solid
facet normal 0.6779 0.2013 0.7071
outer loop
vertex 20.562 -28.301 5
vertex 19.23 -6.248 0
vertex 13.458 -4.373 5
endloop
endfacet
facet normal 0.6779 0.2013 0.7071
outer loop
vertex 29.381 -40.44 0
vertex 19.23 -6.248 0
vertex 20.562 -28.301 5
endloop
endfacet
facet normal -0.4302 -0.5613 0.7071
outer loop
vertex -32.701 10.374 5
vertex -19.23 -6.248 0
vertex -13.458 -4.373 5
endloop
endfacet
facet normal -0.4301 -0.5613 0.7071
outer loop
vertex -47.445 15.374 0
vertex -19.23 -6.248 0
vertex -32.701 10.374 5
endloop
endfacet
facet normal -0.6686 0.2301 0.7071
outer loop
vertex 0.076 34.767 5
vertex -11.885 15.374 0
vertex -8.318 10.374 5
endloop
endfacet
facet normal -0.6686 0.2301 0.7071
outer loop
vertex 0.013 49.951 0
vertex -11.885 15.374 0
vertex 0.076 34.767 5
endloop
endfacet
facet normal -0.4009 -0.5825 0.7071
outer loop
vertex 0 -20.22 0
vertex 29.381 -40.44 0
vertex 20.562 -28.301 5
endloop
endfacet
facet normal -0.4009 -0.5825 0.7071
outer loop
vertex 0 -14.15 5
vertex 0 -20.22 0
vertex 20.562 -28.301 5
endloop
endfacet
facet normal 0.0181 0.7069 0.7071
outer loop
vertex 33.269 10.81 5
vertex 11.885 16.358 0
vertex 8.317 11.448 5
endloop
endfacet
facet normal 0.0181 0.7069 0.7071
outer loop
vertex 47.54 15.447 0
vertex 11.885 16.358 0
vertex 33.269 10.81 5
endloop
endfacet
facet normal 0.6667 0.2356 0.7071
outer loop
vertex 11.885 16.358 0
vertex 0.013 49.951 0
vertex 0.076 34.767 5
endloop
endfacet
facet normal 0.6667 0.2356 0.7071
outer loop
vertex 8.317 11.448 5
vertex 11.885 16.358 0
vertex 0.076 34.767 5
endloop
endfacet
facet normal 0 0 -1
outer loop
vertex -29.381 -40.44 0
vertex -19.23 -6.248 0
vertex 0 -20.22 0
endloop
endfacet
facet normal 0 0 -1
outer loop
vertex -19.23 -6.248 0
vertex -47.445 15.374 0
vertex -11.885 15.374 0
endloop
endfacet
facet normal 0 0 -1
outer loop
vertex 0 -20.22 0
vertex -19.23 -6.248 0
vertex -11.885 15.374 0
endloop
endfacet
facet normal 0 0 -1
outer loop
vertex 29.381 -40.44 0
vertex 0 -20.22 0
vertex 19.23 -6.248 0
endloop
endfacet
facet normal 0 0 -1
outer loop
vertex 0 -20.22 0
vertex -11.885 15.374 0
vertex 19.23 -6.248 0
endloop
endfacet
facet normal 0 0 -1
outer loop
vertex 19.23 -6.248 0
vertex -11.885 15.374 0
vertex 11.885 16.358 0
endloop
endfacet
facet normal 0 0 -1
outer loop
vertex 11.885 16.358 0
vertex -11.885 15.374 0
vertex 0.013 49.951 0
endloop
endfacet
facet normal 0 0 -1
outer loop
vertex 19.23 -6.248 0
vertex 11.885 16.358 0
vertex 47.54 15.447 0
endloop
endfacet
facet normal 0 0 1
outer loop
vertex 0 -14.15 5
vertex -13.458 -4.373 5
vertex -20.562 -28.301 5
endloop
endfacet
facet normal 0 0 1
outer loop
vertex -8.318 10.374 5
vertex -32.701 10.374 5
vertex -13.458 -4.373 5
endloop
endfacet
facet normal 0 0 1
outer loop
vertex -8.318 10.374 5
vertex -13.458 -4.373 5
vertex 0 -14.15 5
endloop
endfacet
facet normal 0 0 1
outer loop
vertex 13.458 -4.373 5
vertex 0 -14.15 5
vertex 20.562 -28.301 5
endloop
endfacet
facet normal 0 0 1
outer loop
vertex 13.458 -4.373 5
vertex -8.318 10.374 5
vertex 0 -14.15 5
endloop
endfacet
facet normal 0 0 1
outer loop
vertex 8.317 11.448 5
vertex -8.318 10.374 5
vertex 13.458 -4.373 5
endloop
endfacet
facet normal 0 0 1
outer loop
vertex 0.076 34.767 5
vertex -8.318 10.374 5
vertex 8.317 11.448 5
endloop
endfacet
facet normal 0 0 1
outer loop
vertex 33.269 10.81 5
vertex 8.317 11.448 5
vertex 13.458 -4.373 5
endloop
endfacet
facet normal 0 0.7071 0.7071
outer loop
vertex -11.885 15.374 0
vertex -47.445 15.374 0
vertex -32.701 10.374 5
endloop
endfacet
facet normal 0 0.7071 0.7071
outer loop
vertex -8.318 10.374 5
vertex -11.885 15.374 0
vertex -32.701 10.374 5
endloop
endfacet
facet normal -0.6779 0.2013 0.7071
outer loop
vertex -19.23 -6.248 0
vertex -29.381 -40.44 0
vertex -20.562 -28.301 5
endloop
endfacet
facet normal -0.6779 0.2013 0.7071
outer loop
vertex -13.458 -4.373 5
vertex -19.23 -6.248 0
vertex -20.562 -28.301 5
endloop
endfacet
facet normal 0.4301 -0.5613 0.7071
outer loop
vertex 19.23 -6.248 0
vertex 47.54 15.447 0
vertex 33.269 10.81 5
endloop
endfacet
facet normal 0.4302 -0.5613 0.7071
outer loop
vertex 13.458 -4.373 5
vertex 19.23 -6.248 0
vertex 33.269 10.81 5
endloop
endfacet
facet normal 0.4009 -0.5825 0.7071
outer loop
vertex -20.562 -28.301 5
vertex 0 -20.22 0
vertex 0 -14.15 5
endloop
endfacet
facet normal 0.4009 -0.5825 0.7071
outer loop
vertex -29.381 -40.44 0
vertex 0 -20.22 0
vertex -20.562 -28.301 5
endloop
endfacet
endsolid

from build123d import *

# Parameters (mm, degrees)
F1_DEPTH      = 5
F2_T4_DEPTH   = 68.6680055615
F2_T9_DEPTH   = 69.5804590238
F2_T14_DEPTH  = 68.6556539851
F2_T19_DEPTH  = 68.6680055615
F2_T24_DEPTH  = 68.6680055615
F2_T29_DEPTH  = 68.6680055615
F2_T34_DEPTH  = 68.6680055615
F2_T39_DEPTH  = 68.6680055615
F2_T44_DEPTH  = 68.6680055615
F2_T49_DEPTH  = 68.6680055615
F2_T55_DEPTH  = 68.6680055615
F2_T59_DEPTH  = 68.6680055615
F2_T66_DEPTH  = 69.5804590238
F2_T70_DEPTH  = 68.6556539851
F2_T77_DEPTH  = 68.6680055615
F2_T81_DEPTH  = 68.6680055615
F2_T88_DEPTH  = 68.6680055615
F2_T92_DEPTH  = 68.6680055615
F2_T99_DEPTH  = 68.6680055615
F2_T103_DEPTH = 68.6680055615


# Not quite as in the source:
# - a fillet or chamfer that OpenCascade refuses, or shapes differently, is made with other operations: its cross-section is extruded or revolved along the edge and cut away or added


with BuildPart() as f1:
    # F0 (on Top) → F1 (new body)
    with BuildSketch(Plane.XY):
        Polygon((0, 0), (0, 52.987328628), (-12.5984860432, 16.3739850326), align=None)
        Polygon((12.5984860432, 17.3403284151), (0, 52.987328628), (0, 0), align=None)
        Polygon((0, 0), (-12.5984860432, 16.3739850326), (-50.3939441727, 16.3739850326), align=None)
        Polygon((50.3939441727, 16.3739850326), (12.5984860432, 17.3403284151), (0, 0), align=None)
        Polygon((20.3847786247, -6.6234160785), (0, 0), (31.1451703259, -42.8676493466), align=None)
        Polygon((0, -21.4338246733), (0, 0), (-31.1451703259, -42.8676493466), align=None)
        Polygon((-20.3847786247, -6.6234160785), (0, 0), (-50.3939441727, 16.3739850326), align=None)
        Polygon((50.3939441727, 16.3739850326), (0, 0), (20.3847786247, -6.6234160785), align=None)
        Polygon((31.1451703259, -42.8676493466), (0, 0), (0, -21.4338246733), align=None)
        Polygon((-31.1451703259, -42.8676493466), (0, 0), (-20.3847786247, -6.6234160785), align=None)
    extrude(amount=F1_DEPTH)

    # F2: chamfer of 6 on 10 edges, made by hand


with BuildPart() as f2_tool2:
    # F2_s3 → F2_t4 (new body)
    with BuildSketch(Plane(origin=(1.0926214012, -3.0915361725, 0), x_dir=(0, 0, 1), z_dir=(-0.3332244354, 0.9428475357, 0))):
        Polygon((-1, 17.6566726657), (5, 11.6566726657), (5, 17.6566726657), align=None)
    extrude(amount=F2_T4_DEPTH)

    split(bisect_by=Plane(origin=(0.451293236, 17.6509043406, 0), x_dir=(0, 0, 1), z_dir=(0.025559359, 0.9996733062, 0)), keep=Keep.TOP)


with BuildPart() as f1_1:
    add(f1.part)

    # F2_t1: cut F2_tool2
    add(f2_tool2.part, mode=Mode.SUBTRACT)


with BuildPart() as f2_tool7:
    # F2_s8 → F2_t9 (new body)
    with BuildSketch(Plane(origin=(21.3229816345, 61.9682119253, 0), x_dir=(0, 0, 1), z_dir=(-0.3253719116, -0.9455861247, 0))):
        Polygon((-1, 17.2405884042), (5, 11.2405884042), (5, 17.2405884042), align=None)
    extrude(amount=F2_T9_DEPTH)

    split(bisect_by=Plane.XZ.offset(-16.3739850326), keep=Keep.BOTTOM)


with BuildPart() as f1_2:
    add(f1_1.part)

    # F2_t6: cut F2_tool7
    add(f2_tool7.part, mode=Mode.SUBTRACT)


with BuildPart() as f2_tool12:
    # F2_s13 → F2_t14 (new body)
    with BuildSketch(Plane.YZ.offset(2.8316118846)):
        Polygon((16.3739850326, -1), (10.3739850326, 5), (16.3739850326, 5), align=None)
    extrude(amount=-F2_T14_DEPTH)

    split(bisect_by=Plane(origin=(-16.3024611761, 5.6096032055, 0), x_dir=(0, 0, 1), z_dir=(-0.9455861247, 0.3253719116, 0)), keep=Keep.TOP)


with BuildPart() as f1_3:
    add(f1_2.part)

    # F2_t11: cut F2_tool12
    add(f2_tool12.part, mode=Mode.SUBTRACT)


with BuildPart() as f2_tool17:
    # F2_s18 → F2_t19 (new body)
    with BuildSketch(Plane(origin=(-51.9012195214, 39.7742870116, 0), x_dir=(0, 0, 1), z_dir=(0.7937292793, -0.6082711823, 0))):
        Polygon((-1, 17.6566726657), (5, 11.6566726657), (5, 17.6566726657), align=None)
    extrude(amount=F2_T19_DEPTH)

    split(bisect_by=Plane(origin=(-16.926464871, 5.0252240345, 0), x_dir=(0, 0, 1), z_dir=(-0.9586440884, 0.2846076455, 0)), keep=Keep.TOP)


with BuildPart() as f1_4:
    add(f1_3.part)

    # F2_t16: cut F2_tool17
    add(f2_tool17.part, mode=Mode.SUBTRACT)


with BuildPart() as f2_tool22:
    # F2_s23 → F2_t24 (new body)
    with BuildSketch(Plane(origin=(0.9332100871, 3.1433320482, 0), x_dir=(0, 0, 1), z_dir=(-0.2846076455, -0.9586440884, 0))):
        Polygon((-1, 17.6566726657), (5, 11.6566726657), (5, 17.6566726657), align=None)
    extrude(amount=F2_T24_DEPTH)

    split(bisect_by=Plane(origin=(-10.7400451584, -14.014618069, 0), x_dir=(0, 0, 1), z_dir=(-0.6082711823, -0.7937292793, 0)), keep=Keep.TOP)


with BuildPart() as f1_5:
    add(f1_4.part)

    # F2_t21: cut F2_tool22
    add(f2_tool22.part, mode=Mode.SUBTRACT)


with BuildPart() as f2_tool27:
    # F2_s28 → F2_t29 (new body)
    with BuildSketch(Plane(origin=(-53.8659537043, -37.0700624038, 0), x_dir=(0, 0, 1), z_dir=(0.8237761079, 0.5669152707, 0))):
        Polygon((-1, 17.6566726657), (5, 11.6566726657), (5, 17.6566726657), align=None)
    extrude(amount=F2_T29_DEPTH)

    split(bisect_by=Plane(origin=(-10.0098373636, -14.5451450862, 0), x_dir=(0, 0, 1), z_dir=(-0.5669152707, -0.8237761079, 0)), keep=Keep.TOP)


with BuildPart() as f1_6:
    add(f1_5.part)

    # F2_t26: cut F2_tool27
    add(f2_tool27.part, mode=Mode.SUBTRACT)


with BuildPart() as f2_tool32:
    # F2_s33 → F2_t34 (new body)
    with BuildSketch(Plane(origin=(-2.7011086511, 1.8588785563, 0), x_dir=(0, 0, 1), z_dir=(0.8237761079, -0.5669152707, 0))):
        Polygon((-1, 17.6566726657), (5, 11.6566726657), (5, 17.6566726657), align=None)
    extrude(amount=F2_T34_DEPTH)

    split(bisect_by=Plane(origin=(10.0098373636, -14.5451450862, 0), x_dir=(0, 0, 1), z_dir=(0.5669152707, -0.8237761079, 0)), keep=Keep.TOP)


with BuildPart() as f1_7:
    add(f1_6.part)

    # F2_t31: cut F2_tool32
    add(f2_tool32.part, mode=Mode.SUBTRACT)


with BuildPart() as f2_tool37:
    # F2_s38 → F2_t39 (new body)
    with BuildSketch(Plane(origin=(18.6102292957, -62.6848455422, 0), x_dir=(0, 0, 1), z_dir=(-0.2846076455, 0.9586440884, 0))):
        Polygon((-1, 17.6566726657), (5, 11.6566726657), (5, 17.6566726657), align=None)
    extrude(amount=F2_T39_DEPTH)

    split(bisect_by=Plane(origin=(10.7400451584, -14.014618069, 0), x_dir=(0, 0, 1), z_dir=(0.6082711823, -0.7937292793, 0)), keep=Keep.TOP)


with BuildPart() as f1_8:
    add(f1_7.part)

    # F2_t36: cut F2_tool37
    add(f2_tool37.part, mode=Mode.SUBTRACT)


with BuildPart() as f2_tool42:
    # F2_s43 → F2_t44 (new body)
    with BuildSketch(Plane(origin=(-2.6025870408, -1.9944819195, 0), x_dir=(0, 0, 1), z_dir=(0.7937292793, 0.6082711823, 0))):
        Polygon((-1, 17.6566726657), (5, 11.6566726657), (5, 17.6566726657), align=None)
    extrude(amount=F2_T44_DEPTH)

    split(bisect_by=Plane(origin=(16.926464871, 5.0252240345, 0), x_dir=(0, 0, 1), z_dir=(0.9586440884, 0.2846076455, 0)), keep=Keep.TOP)


with BuildPart() as f1_9:
    add(f1_8.part)

    # F2_t41: cut F2_tool42
    add(f2_tool42.part, mode=Mode.SUBTRACT)


with BuildPart() as f2_tool47:
    # F2_s48 → F2_t49 (new body)
    with BuildSketch(Plane(origin=(65.3677079475, -1.6713027209, 0), x_dir=(0, 0, 1), z_dir=(-0.9996733062, 0.025559359, 0))):
        Polygon((-1, 17.6566726657), (5, 11.6566726657), (5, 17.6566726657), align=None)
    extrude(amount=F2_T49_DEPTH)

    split(bisect_by=Plane(origin=(16.6475503122, 5.8836347802, 0), x_dir=(0, 0, 1), z_dir=(0.9428475357, 0.3332244354, 0)), keep=Keep.TOP)


with BuildPart() as f1_10:
    add(f1_9.part)

    # F2_t46: cut F2_tool47
    add(f2_tool47.part, mode=Mode.SUBTRACT)


with BuildPart() as f2_tool53:
    # F2_s54 → F2_t55 (new body)
    with BuildSketch(Plane(origin=(1.0926214012, -3.0915361725, 0), x_dir=(0, 0, 1), z_dir=(-0.3332244354, 0.9428475357, 0))):
        Polygon((-1, 17.6566726657), (5, 11.6566726657), (5, 17.6566726657), align=None)
    extrude(amount=F2_T55_DEPTH)

    split(bisect_by=Plane(origin=(0.451293236, 17.6509043406, 0), x_dir=(0, 0, 1), z_dir=(-0.025559359, -0.9996733062, 0)), keep=Keep.TOP)


with BuildPart() as f2_tool57:
    # F2_s58 → F2_t59 (new body)
    with BuildSketch(Plane(origin=(65.3677079475, -1.6713027209, 0), x_dir=(0, 0, 1), z_dir=(-0.9996733062, 0.025559359, 0))):
        Polygon((-1, 17.6566726657), (5, 11.6566726657), (5, 17.6566726657), align=None)
    extrude(amount=F2_T59_DEPTH)

    split(bisect_by=Plane(origin=(16.6475503122, 5.8836347802, 0), x_dir=(0, 0, 1), z_dir=(-0.9428475357, -0.3332244354, 0)), keep=Keep.TOP)


with BuildPart() as f2_tool53_1:
    add(f2_tool53.part)

    # F2_t61: intersect F2_tool57
    add(f2_tool57.part, mode=Mode.INTERSECT)


with BuildPart() as f1_11:
    add(f1_10.part)

    # F2_t51: cut F2_tool53
    add(f2_tool53_1.part, mode=Mode.SUBTRACT)


with BuildPart() as f2_tool64:
    # F2_s65 → F2_t66 (new body)
    with BuildSketch(Plane(origin=(21.3229816345, 61.9682119253, 0), x_dir=(0, 0, 1), z_dir=(-0.3253719116, -0.9455861247, 0))):
        Polygon((-1, 17.2405884042), (5, 11.2405884042), (5, 17.2405884042), align=None)
    extrude(amount=F2_T66_DEPTH)

    split(bisect_by=Plane.XZ.offset(-16.3739850326), keep=Keep.TOP)


with BuildPart() as f2_tool68:
    # F2_s69 → F2_t70 (new body)
    with BuildSketch(Plane.YZ.offset(2.8316118846)):
        Polygon((16.3739850326, -1), (10.3739850326, 5), (16.3739850326, 5), align=None)
    extrude(amount=-F2_T70_DEPTH)

    split(bisect_by=Plane(origin=(-16.3024611761, 5.6096032055, 0), x_dir=(0, 0, 1), z_dir=(0.9455861247, -0.3253719116, 0)), keep=Keep.TOP)


with BuildPart() as f2_tool64_1:
    add(f2_tool64.part)

    # F2_t72: intersect F2_tool68
    add(f2_tool68.part, mode=Mode.INTERSECT)


with BuildPart() as f1_12:
    add(f1_11.part)

    # F2_t62: cut F2_tool64
    add(f2_tool64_1.part, mode=Mode.SUBTRACT)


with BuildPart() as f2_tool75:
    # F2_s76 → F2_t77 (new body)
    with BuildSketch(Plane(origin=(-51.9012195214, 39.7742870116, 0), x_dir=(0, 0, 1), z_dir=(0.7937292793, -0.6082711823, 0))):
        Polygon((-1, 17.6566726657), (5, 11.6566726657), (5, 17.6566726657), align=None)
    extrude(amount=F2_T77_DEPTH)

    split(bisect_by=Plane(origin=(-16.926464871, 5.0252240345, 0), x_dir=(0, 0, 1), z_dir=(0.9586440884, -0.2846076455, 0)), keep=Keep.TOP)


with BuildPart() as f2_tool79:
    # F2_s80 → F2_t81 (new body)
    with BuildSketch(Plane(origin=(0.9332100871, 3.1433320482, 0), x_dir=(0, 0, 1), z_dir=(-0.2846076455, -0.9586440884, 0))):
        Polygon((-1, 17.6566726657), (5, 11.6566726657), (5, 17.6566726657), align=None)
    extrude(amount=F2_T81_DEPTH)

    split(bisect_by=Plane(origin=(-10.7400451584, -14.014618069, 0), x_dir=(0, 0, 1), z_dir=(0.6082711823, 0.7937292793, 0)), keep=Keep.TOP)


with BuildPart() as f2_tool75_1:
    add(f2_tool75.part)

    # F2_t83: intersect F2_tool79
    add(f2_tool79.part, mode=Mode.INTERSECT)


with BuildPart() as f1_13:
    add(f1_12.part)

    # F2_t73: cut F2_tool75
    add(f2_tool75_1.part, mode=Mode.SUBTRACT)


with BuildPart() as f2_tool86:
    # F2_s87 → F2_t88 (new body)
    with BuildSketch(Plane(origin=(-53.8659537043, -37.0700624038, 0), x_dir=(0, 0, 1), z_dir=(0.8237761079, 0.5669152707, 0))):
        Polygon((-1, 17.6566726657), (5, 11.6566726657), (5, 17.6566726657), align=None)
    extrude(amount=F2_T88_DEPTH)

    split(bisect_by=Plane(origin=(-10.0098373636, -14.5451450862, 0), x_dir=(0, 0, 1), z_dir=(0.5669152707, 0.8237761079, 0)), keep=Keep.TOP)


with BuildPart() as f2_tool90:
    # F2_s91 → F2_t92 (new body)
    with BuildSketch(Plane(origin=(-2.7011086511, 1.8588785563, 0), x_dir=(0, 0, 1), z_dir=(0.8237761079, -0.5669152707, 0))):
        Polygon((-1, 17.6566726657), (5, 11.6566726657), (5, 17.6566726657), align=None)
    extrude(amount=F2_T92_DEPTH)

    split(bisect_by=Plane(origin=(10.0098373636, -14.5451450862, 0), x_dir=(0, 0, 1), z_dir=(-0.5669152707, 0.8237761079, 0)), keep=Keep.TOP)


with BuildPart() as f2_tool86_1:
    add(f2_tool86.part)

    # F2_t94: intersect F2_tool90
    add(f2_tool90.part, mode=Mode.INTERSECT)


with BuildPart() as f1_14:
    add(f1_13.part)

    # F2_t84: cut F2_tool86
    add(f2_tool86_1.part, mode=Mode.SUBTRACT)


with BuildPart() as f2_tool97:
    # F2_s98 → F2_t99 (new body)
    with BuildSketch(Plane(origin=(18.6102292957, -62.6848455422, 0), x_dir=(0, 0, 1), z_dir=(-0.2846076455, 0.9586440884, 0))):
        Polygon((-1, 17.6566726657), (5, 11.6566726657), (5, 17.6566726657), align=None)
    extrude(amount=F2_T99_DEPTH)

    split(bisect_by=Plane(origin=(10.7400451584, -14.014618069, 0), x_dir=(0, 0, 1), z_dir=(-0.6082711823, 0.7937292793, 0)), keep=Keep.TOP)


with BuildPart() as f2_tool101:
    # F2_s102 → F2_t103 (new body)
    with BuildSketch(Plane(origin=(-2.6025870408, -1.9944819195, 0), x_dir=(0, 0, 1), z_dir=(0.7937292793, 0.6082711823, 0))):
        Polygon((-1, 17.6566726657), (5, 11.6566726657), (5, 17.6566726657), align=None)
    extrude(amount=F2_T103_DEPTH)

    split(bisect_by=Plane(origin=(16.926464871, 5.0252240345, 0), x_dir=(0, 0, 1), z_dir=(-0.9586440884, -0.2846076455, 0)), keep=Keep.TOP)


with BuildPart() as f2_tool97_1:
    add(f2_tool97.part)

    # F2_t105: intersect F2_tool101
    add(f2_tool101.part, mode=Mode.INTERSECT)


with BuildPart() as f1_15:
    add(f1_14.part)

    # F2_t95: cut F2_tool97
    add(f2_tool97_1.part, mode=Mode.SUBTRACT)


solid = f1_15.part
